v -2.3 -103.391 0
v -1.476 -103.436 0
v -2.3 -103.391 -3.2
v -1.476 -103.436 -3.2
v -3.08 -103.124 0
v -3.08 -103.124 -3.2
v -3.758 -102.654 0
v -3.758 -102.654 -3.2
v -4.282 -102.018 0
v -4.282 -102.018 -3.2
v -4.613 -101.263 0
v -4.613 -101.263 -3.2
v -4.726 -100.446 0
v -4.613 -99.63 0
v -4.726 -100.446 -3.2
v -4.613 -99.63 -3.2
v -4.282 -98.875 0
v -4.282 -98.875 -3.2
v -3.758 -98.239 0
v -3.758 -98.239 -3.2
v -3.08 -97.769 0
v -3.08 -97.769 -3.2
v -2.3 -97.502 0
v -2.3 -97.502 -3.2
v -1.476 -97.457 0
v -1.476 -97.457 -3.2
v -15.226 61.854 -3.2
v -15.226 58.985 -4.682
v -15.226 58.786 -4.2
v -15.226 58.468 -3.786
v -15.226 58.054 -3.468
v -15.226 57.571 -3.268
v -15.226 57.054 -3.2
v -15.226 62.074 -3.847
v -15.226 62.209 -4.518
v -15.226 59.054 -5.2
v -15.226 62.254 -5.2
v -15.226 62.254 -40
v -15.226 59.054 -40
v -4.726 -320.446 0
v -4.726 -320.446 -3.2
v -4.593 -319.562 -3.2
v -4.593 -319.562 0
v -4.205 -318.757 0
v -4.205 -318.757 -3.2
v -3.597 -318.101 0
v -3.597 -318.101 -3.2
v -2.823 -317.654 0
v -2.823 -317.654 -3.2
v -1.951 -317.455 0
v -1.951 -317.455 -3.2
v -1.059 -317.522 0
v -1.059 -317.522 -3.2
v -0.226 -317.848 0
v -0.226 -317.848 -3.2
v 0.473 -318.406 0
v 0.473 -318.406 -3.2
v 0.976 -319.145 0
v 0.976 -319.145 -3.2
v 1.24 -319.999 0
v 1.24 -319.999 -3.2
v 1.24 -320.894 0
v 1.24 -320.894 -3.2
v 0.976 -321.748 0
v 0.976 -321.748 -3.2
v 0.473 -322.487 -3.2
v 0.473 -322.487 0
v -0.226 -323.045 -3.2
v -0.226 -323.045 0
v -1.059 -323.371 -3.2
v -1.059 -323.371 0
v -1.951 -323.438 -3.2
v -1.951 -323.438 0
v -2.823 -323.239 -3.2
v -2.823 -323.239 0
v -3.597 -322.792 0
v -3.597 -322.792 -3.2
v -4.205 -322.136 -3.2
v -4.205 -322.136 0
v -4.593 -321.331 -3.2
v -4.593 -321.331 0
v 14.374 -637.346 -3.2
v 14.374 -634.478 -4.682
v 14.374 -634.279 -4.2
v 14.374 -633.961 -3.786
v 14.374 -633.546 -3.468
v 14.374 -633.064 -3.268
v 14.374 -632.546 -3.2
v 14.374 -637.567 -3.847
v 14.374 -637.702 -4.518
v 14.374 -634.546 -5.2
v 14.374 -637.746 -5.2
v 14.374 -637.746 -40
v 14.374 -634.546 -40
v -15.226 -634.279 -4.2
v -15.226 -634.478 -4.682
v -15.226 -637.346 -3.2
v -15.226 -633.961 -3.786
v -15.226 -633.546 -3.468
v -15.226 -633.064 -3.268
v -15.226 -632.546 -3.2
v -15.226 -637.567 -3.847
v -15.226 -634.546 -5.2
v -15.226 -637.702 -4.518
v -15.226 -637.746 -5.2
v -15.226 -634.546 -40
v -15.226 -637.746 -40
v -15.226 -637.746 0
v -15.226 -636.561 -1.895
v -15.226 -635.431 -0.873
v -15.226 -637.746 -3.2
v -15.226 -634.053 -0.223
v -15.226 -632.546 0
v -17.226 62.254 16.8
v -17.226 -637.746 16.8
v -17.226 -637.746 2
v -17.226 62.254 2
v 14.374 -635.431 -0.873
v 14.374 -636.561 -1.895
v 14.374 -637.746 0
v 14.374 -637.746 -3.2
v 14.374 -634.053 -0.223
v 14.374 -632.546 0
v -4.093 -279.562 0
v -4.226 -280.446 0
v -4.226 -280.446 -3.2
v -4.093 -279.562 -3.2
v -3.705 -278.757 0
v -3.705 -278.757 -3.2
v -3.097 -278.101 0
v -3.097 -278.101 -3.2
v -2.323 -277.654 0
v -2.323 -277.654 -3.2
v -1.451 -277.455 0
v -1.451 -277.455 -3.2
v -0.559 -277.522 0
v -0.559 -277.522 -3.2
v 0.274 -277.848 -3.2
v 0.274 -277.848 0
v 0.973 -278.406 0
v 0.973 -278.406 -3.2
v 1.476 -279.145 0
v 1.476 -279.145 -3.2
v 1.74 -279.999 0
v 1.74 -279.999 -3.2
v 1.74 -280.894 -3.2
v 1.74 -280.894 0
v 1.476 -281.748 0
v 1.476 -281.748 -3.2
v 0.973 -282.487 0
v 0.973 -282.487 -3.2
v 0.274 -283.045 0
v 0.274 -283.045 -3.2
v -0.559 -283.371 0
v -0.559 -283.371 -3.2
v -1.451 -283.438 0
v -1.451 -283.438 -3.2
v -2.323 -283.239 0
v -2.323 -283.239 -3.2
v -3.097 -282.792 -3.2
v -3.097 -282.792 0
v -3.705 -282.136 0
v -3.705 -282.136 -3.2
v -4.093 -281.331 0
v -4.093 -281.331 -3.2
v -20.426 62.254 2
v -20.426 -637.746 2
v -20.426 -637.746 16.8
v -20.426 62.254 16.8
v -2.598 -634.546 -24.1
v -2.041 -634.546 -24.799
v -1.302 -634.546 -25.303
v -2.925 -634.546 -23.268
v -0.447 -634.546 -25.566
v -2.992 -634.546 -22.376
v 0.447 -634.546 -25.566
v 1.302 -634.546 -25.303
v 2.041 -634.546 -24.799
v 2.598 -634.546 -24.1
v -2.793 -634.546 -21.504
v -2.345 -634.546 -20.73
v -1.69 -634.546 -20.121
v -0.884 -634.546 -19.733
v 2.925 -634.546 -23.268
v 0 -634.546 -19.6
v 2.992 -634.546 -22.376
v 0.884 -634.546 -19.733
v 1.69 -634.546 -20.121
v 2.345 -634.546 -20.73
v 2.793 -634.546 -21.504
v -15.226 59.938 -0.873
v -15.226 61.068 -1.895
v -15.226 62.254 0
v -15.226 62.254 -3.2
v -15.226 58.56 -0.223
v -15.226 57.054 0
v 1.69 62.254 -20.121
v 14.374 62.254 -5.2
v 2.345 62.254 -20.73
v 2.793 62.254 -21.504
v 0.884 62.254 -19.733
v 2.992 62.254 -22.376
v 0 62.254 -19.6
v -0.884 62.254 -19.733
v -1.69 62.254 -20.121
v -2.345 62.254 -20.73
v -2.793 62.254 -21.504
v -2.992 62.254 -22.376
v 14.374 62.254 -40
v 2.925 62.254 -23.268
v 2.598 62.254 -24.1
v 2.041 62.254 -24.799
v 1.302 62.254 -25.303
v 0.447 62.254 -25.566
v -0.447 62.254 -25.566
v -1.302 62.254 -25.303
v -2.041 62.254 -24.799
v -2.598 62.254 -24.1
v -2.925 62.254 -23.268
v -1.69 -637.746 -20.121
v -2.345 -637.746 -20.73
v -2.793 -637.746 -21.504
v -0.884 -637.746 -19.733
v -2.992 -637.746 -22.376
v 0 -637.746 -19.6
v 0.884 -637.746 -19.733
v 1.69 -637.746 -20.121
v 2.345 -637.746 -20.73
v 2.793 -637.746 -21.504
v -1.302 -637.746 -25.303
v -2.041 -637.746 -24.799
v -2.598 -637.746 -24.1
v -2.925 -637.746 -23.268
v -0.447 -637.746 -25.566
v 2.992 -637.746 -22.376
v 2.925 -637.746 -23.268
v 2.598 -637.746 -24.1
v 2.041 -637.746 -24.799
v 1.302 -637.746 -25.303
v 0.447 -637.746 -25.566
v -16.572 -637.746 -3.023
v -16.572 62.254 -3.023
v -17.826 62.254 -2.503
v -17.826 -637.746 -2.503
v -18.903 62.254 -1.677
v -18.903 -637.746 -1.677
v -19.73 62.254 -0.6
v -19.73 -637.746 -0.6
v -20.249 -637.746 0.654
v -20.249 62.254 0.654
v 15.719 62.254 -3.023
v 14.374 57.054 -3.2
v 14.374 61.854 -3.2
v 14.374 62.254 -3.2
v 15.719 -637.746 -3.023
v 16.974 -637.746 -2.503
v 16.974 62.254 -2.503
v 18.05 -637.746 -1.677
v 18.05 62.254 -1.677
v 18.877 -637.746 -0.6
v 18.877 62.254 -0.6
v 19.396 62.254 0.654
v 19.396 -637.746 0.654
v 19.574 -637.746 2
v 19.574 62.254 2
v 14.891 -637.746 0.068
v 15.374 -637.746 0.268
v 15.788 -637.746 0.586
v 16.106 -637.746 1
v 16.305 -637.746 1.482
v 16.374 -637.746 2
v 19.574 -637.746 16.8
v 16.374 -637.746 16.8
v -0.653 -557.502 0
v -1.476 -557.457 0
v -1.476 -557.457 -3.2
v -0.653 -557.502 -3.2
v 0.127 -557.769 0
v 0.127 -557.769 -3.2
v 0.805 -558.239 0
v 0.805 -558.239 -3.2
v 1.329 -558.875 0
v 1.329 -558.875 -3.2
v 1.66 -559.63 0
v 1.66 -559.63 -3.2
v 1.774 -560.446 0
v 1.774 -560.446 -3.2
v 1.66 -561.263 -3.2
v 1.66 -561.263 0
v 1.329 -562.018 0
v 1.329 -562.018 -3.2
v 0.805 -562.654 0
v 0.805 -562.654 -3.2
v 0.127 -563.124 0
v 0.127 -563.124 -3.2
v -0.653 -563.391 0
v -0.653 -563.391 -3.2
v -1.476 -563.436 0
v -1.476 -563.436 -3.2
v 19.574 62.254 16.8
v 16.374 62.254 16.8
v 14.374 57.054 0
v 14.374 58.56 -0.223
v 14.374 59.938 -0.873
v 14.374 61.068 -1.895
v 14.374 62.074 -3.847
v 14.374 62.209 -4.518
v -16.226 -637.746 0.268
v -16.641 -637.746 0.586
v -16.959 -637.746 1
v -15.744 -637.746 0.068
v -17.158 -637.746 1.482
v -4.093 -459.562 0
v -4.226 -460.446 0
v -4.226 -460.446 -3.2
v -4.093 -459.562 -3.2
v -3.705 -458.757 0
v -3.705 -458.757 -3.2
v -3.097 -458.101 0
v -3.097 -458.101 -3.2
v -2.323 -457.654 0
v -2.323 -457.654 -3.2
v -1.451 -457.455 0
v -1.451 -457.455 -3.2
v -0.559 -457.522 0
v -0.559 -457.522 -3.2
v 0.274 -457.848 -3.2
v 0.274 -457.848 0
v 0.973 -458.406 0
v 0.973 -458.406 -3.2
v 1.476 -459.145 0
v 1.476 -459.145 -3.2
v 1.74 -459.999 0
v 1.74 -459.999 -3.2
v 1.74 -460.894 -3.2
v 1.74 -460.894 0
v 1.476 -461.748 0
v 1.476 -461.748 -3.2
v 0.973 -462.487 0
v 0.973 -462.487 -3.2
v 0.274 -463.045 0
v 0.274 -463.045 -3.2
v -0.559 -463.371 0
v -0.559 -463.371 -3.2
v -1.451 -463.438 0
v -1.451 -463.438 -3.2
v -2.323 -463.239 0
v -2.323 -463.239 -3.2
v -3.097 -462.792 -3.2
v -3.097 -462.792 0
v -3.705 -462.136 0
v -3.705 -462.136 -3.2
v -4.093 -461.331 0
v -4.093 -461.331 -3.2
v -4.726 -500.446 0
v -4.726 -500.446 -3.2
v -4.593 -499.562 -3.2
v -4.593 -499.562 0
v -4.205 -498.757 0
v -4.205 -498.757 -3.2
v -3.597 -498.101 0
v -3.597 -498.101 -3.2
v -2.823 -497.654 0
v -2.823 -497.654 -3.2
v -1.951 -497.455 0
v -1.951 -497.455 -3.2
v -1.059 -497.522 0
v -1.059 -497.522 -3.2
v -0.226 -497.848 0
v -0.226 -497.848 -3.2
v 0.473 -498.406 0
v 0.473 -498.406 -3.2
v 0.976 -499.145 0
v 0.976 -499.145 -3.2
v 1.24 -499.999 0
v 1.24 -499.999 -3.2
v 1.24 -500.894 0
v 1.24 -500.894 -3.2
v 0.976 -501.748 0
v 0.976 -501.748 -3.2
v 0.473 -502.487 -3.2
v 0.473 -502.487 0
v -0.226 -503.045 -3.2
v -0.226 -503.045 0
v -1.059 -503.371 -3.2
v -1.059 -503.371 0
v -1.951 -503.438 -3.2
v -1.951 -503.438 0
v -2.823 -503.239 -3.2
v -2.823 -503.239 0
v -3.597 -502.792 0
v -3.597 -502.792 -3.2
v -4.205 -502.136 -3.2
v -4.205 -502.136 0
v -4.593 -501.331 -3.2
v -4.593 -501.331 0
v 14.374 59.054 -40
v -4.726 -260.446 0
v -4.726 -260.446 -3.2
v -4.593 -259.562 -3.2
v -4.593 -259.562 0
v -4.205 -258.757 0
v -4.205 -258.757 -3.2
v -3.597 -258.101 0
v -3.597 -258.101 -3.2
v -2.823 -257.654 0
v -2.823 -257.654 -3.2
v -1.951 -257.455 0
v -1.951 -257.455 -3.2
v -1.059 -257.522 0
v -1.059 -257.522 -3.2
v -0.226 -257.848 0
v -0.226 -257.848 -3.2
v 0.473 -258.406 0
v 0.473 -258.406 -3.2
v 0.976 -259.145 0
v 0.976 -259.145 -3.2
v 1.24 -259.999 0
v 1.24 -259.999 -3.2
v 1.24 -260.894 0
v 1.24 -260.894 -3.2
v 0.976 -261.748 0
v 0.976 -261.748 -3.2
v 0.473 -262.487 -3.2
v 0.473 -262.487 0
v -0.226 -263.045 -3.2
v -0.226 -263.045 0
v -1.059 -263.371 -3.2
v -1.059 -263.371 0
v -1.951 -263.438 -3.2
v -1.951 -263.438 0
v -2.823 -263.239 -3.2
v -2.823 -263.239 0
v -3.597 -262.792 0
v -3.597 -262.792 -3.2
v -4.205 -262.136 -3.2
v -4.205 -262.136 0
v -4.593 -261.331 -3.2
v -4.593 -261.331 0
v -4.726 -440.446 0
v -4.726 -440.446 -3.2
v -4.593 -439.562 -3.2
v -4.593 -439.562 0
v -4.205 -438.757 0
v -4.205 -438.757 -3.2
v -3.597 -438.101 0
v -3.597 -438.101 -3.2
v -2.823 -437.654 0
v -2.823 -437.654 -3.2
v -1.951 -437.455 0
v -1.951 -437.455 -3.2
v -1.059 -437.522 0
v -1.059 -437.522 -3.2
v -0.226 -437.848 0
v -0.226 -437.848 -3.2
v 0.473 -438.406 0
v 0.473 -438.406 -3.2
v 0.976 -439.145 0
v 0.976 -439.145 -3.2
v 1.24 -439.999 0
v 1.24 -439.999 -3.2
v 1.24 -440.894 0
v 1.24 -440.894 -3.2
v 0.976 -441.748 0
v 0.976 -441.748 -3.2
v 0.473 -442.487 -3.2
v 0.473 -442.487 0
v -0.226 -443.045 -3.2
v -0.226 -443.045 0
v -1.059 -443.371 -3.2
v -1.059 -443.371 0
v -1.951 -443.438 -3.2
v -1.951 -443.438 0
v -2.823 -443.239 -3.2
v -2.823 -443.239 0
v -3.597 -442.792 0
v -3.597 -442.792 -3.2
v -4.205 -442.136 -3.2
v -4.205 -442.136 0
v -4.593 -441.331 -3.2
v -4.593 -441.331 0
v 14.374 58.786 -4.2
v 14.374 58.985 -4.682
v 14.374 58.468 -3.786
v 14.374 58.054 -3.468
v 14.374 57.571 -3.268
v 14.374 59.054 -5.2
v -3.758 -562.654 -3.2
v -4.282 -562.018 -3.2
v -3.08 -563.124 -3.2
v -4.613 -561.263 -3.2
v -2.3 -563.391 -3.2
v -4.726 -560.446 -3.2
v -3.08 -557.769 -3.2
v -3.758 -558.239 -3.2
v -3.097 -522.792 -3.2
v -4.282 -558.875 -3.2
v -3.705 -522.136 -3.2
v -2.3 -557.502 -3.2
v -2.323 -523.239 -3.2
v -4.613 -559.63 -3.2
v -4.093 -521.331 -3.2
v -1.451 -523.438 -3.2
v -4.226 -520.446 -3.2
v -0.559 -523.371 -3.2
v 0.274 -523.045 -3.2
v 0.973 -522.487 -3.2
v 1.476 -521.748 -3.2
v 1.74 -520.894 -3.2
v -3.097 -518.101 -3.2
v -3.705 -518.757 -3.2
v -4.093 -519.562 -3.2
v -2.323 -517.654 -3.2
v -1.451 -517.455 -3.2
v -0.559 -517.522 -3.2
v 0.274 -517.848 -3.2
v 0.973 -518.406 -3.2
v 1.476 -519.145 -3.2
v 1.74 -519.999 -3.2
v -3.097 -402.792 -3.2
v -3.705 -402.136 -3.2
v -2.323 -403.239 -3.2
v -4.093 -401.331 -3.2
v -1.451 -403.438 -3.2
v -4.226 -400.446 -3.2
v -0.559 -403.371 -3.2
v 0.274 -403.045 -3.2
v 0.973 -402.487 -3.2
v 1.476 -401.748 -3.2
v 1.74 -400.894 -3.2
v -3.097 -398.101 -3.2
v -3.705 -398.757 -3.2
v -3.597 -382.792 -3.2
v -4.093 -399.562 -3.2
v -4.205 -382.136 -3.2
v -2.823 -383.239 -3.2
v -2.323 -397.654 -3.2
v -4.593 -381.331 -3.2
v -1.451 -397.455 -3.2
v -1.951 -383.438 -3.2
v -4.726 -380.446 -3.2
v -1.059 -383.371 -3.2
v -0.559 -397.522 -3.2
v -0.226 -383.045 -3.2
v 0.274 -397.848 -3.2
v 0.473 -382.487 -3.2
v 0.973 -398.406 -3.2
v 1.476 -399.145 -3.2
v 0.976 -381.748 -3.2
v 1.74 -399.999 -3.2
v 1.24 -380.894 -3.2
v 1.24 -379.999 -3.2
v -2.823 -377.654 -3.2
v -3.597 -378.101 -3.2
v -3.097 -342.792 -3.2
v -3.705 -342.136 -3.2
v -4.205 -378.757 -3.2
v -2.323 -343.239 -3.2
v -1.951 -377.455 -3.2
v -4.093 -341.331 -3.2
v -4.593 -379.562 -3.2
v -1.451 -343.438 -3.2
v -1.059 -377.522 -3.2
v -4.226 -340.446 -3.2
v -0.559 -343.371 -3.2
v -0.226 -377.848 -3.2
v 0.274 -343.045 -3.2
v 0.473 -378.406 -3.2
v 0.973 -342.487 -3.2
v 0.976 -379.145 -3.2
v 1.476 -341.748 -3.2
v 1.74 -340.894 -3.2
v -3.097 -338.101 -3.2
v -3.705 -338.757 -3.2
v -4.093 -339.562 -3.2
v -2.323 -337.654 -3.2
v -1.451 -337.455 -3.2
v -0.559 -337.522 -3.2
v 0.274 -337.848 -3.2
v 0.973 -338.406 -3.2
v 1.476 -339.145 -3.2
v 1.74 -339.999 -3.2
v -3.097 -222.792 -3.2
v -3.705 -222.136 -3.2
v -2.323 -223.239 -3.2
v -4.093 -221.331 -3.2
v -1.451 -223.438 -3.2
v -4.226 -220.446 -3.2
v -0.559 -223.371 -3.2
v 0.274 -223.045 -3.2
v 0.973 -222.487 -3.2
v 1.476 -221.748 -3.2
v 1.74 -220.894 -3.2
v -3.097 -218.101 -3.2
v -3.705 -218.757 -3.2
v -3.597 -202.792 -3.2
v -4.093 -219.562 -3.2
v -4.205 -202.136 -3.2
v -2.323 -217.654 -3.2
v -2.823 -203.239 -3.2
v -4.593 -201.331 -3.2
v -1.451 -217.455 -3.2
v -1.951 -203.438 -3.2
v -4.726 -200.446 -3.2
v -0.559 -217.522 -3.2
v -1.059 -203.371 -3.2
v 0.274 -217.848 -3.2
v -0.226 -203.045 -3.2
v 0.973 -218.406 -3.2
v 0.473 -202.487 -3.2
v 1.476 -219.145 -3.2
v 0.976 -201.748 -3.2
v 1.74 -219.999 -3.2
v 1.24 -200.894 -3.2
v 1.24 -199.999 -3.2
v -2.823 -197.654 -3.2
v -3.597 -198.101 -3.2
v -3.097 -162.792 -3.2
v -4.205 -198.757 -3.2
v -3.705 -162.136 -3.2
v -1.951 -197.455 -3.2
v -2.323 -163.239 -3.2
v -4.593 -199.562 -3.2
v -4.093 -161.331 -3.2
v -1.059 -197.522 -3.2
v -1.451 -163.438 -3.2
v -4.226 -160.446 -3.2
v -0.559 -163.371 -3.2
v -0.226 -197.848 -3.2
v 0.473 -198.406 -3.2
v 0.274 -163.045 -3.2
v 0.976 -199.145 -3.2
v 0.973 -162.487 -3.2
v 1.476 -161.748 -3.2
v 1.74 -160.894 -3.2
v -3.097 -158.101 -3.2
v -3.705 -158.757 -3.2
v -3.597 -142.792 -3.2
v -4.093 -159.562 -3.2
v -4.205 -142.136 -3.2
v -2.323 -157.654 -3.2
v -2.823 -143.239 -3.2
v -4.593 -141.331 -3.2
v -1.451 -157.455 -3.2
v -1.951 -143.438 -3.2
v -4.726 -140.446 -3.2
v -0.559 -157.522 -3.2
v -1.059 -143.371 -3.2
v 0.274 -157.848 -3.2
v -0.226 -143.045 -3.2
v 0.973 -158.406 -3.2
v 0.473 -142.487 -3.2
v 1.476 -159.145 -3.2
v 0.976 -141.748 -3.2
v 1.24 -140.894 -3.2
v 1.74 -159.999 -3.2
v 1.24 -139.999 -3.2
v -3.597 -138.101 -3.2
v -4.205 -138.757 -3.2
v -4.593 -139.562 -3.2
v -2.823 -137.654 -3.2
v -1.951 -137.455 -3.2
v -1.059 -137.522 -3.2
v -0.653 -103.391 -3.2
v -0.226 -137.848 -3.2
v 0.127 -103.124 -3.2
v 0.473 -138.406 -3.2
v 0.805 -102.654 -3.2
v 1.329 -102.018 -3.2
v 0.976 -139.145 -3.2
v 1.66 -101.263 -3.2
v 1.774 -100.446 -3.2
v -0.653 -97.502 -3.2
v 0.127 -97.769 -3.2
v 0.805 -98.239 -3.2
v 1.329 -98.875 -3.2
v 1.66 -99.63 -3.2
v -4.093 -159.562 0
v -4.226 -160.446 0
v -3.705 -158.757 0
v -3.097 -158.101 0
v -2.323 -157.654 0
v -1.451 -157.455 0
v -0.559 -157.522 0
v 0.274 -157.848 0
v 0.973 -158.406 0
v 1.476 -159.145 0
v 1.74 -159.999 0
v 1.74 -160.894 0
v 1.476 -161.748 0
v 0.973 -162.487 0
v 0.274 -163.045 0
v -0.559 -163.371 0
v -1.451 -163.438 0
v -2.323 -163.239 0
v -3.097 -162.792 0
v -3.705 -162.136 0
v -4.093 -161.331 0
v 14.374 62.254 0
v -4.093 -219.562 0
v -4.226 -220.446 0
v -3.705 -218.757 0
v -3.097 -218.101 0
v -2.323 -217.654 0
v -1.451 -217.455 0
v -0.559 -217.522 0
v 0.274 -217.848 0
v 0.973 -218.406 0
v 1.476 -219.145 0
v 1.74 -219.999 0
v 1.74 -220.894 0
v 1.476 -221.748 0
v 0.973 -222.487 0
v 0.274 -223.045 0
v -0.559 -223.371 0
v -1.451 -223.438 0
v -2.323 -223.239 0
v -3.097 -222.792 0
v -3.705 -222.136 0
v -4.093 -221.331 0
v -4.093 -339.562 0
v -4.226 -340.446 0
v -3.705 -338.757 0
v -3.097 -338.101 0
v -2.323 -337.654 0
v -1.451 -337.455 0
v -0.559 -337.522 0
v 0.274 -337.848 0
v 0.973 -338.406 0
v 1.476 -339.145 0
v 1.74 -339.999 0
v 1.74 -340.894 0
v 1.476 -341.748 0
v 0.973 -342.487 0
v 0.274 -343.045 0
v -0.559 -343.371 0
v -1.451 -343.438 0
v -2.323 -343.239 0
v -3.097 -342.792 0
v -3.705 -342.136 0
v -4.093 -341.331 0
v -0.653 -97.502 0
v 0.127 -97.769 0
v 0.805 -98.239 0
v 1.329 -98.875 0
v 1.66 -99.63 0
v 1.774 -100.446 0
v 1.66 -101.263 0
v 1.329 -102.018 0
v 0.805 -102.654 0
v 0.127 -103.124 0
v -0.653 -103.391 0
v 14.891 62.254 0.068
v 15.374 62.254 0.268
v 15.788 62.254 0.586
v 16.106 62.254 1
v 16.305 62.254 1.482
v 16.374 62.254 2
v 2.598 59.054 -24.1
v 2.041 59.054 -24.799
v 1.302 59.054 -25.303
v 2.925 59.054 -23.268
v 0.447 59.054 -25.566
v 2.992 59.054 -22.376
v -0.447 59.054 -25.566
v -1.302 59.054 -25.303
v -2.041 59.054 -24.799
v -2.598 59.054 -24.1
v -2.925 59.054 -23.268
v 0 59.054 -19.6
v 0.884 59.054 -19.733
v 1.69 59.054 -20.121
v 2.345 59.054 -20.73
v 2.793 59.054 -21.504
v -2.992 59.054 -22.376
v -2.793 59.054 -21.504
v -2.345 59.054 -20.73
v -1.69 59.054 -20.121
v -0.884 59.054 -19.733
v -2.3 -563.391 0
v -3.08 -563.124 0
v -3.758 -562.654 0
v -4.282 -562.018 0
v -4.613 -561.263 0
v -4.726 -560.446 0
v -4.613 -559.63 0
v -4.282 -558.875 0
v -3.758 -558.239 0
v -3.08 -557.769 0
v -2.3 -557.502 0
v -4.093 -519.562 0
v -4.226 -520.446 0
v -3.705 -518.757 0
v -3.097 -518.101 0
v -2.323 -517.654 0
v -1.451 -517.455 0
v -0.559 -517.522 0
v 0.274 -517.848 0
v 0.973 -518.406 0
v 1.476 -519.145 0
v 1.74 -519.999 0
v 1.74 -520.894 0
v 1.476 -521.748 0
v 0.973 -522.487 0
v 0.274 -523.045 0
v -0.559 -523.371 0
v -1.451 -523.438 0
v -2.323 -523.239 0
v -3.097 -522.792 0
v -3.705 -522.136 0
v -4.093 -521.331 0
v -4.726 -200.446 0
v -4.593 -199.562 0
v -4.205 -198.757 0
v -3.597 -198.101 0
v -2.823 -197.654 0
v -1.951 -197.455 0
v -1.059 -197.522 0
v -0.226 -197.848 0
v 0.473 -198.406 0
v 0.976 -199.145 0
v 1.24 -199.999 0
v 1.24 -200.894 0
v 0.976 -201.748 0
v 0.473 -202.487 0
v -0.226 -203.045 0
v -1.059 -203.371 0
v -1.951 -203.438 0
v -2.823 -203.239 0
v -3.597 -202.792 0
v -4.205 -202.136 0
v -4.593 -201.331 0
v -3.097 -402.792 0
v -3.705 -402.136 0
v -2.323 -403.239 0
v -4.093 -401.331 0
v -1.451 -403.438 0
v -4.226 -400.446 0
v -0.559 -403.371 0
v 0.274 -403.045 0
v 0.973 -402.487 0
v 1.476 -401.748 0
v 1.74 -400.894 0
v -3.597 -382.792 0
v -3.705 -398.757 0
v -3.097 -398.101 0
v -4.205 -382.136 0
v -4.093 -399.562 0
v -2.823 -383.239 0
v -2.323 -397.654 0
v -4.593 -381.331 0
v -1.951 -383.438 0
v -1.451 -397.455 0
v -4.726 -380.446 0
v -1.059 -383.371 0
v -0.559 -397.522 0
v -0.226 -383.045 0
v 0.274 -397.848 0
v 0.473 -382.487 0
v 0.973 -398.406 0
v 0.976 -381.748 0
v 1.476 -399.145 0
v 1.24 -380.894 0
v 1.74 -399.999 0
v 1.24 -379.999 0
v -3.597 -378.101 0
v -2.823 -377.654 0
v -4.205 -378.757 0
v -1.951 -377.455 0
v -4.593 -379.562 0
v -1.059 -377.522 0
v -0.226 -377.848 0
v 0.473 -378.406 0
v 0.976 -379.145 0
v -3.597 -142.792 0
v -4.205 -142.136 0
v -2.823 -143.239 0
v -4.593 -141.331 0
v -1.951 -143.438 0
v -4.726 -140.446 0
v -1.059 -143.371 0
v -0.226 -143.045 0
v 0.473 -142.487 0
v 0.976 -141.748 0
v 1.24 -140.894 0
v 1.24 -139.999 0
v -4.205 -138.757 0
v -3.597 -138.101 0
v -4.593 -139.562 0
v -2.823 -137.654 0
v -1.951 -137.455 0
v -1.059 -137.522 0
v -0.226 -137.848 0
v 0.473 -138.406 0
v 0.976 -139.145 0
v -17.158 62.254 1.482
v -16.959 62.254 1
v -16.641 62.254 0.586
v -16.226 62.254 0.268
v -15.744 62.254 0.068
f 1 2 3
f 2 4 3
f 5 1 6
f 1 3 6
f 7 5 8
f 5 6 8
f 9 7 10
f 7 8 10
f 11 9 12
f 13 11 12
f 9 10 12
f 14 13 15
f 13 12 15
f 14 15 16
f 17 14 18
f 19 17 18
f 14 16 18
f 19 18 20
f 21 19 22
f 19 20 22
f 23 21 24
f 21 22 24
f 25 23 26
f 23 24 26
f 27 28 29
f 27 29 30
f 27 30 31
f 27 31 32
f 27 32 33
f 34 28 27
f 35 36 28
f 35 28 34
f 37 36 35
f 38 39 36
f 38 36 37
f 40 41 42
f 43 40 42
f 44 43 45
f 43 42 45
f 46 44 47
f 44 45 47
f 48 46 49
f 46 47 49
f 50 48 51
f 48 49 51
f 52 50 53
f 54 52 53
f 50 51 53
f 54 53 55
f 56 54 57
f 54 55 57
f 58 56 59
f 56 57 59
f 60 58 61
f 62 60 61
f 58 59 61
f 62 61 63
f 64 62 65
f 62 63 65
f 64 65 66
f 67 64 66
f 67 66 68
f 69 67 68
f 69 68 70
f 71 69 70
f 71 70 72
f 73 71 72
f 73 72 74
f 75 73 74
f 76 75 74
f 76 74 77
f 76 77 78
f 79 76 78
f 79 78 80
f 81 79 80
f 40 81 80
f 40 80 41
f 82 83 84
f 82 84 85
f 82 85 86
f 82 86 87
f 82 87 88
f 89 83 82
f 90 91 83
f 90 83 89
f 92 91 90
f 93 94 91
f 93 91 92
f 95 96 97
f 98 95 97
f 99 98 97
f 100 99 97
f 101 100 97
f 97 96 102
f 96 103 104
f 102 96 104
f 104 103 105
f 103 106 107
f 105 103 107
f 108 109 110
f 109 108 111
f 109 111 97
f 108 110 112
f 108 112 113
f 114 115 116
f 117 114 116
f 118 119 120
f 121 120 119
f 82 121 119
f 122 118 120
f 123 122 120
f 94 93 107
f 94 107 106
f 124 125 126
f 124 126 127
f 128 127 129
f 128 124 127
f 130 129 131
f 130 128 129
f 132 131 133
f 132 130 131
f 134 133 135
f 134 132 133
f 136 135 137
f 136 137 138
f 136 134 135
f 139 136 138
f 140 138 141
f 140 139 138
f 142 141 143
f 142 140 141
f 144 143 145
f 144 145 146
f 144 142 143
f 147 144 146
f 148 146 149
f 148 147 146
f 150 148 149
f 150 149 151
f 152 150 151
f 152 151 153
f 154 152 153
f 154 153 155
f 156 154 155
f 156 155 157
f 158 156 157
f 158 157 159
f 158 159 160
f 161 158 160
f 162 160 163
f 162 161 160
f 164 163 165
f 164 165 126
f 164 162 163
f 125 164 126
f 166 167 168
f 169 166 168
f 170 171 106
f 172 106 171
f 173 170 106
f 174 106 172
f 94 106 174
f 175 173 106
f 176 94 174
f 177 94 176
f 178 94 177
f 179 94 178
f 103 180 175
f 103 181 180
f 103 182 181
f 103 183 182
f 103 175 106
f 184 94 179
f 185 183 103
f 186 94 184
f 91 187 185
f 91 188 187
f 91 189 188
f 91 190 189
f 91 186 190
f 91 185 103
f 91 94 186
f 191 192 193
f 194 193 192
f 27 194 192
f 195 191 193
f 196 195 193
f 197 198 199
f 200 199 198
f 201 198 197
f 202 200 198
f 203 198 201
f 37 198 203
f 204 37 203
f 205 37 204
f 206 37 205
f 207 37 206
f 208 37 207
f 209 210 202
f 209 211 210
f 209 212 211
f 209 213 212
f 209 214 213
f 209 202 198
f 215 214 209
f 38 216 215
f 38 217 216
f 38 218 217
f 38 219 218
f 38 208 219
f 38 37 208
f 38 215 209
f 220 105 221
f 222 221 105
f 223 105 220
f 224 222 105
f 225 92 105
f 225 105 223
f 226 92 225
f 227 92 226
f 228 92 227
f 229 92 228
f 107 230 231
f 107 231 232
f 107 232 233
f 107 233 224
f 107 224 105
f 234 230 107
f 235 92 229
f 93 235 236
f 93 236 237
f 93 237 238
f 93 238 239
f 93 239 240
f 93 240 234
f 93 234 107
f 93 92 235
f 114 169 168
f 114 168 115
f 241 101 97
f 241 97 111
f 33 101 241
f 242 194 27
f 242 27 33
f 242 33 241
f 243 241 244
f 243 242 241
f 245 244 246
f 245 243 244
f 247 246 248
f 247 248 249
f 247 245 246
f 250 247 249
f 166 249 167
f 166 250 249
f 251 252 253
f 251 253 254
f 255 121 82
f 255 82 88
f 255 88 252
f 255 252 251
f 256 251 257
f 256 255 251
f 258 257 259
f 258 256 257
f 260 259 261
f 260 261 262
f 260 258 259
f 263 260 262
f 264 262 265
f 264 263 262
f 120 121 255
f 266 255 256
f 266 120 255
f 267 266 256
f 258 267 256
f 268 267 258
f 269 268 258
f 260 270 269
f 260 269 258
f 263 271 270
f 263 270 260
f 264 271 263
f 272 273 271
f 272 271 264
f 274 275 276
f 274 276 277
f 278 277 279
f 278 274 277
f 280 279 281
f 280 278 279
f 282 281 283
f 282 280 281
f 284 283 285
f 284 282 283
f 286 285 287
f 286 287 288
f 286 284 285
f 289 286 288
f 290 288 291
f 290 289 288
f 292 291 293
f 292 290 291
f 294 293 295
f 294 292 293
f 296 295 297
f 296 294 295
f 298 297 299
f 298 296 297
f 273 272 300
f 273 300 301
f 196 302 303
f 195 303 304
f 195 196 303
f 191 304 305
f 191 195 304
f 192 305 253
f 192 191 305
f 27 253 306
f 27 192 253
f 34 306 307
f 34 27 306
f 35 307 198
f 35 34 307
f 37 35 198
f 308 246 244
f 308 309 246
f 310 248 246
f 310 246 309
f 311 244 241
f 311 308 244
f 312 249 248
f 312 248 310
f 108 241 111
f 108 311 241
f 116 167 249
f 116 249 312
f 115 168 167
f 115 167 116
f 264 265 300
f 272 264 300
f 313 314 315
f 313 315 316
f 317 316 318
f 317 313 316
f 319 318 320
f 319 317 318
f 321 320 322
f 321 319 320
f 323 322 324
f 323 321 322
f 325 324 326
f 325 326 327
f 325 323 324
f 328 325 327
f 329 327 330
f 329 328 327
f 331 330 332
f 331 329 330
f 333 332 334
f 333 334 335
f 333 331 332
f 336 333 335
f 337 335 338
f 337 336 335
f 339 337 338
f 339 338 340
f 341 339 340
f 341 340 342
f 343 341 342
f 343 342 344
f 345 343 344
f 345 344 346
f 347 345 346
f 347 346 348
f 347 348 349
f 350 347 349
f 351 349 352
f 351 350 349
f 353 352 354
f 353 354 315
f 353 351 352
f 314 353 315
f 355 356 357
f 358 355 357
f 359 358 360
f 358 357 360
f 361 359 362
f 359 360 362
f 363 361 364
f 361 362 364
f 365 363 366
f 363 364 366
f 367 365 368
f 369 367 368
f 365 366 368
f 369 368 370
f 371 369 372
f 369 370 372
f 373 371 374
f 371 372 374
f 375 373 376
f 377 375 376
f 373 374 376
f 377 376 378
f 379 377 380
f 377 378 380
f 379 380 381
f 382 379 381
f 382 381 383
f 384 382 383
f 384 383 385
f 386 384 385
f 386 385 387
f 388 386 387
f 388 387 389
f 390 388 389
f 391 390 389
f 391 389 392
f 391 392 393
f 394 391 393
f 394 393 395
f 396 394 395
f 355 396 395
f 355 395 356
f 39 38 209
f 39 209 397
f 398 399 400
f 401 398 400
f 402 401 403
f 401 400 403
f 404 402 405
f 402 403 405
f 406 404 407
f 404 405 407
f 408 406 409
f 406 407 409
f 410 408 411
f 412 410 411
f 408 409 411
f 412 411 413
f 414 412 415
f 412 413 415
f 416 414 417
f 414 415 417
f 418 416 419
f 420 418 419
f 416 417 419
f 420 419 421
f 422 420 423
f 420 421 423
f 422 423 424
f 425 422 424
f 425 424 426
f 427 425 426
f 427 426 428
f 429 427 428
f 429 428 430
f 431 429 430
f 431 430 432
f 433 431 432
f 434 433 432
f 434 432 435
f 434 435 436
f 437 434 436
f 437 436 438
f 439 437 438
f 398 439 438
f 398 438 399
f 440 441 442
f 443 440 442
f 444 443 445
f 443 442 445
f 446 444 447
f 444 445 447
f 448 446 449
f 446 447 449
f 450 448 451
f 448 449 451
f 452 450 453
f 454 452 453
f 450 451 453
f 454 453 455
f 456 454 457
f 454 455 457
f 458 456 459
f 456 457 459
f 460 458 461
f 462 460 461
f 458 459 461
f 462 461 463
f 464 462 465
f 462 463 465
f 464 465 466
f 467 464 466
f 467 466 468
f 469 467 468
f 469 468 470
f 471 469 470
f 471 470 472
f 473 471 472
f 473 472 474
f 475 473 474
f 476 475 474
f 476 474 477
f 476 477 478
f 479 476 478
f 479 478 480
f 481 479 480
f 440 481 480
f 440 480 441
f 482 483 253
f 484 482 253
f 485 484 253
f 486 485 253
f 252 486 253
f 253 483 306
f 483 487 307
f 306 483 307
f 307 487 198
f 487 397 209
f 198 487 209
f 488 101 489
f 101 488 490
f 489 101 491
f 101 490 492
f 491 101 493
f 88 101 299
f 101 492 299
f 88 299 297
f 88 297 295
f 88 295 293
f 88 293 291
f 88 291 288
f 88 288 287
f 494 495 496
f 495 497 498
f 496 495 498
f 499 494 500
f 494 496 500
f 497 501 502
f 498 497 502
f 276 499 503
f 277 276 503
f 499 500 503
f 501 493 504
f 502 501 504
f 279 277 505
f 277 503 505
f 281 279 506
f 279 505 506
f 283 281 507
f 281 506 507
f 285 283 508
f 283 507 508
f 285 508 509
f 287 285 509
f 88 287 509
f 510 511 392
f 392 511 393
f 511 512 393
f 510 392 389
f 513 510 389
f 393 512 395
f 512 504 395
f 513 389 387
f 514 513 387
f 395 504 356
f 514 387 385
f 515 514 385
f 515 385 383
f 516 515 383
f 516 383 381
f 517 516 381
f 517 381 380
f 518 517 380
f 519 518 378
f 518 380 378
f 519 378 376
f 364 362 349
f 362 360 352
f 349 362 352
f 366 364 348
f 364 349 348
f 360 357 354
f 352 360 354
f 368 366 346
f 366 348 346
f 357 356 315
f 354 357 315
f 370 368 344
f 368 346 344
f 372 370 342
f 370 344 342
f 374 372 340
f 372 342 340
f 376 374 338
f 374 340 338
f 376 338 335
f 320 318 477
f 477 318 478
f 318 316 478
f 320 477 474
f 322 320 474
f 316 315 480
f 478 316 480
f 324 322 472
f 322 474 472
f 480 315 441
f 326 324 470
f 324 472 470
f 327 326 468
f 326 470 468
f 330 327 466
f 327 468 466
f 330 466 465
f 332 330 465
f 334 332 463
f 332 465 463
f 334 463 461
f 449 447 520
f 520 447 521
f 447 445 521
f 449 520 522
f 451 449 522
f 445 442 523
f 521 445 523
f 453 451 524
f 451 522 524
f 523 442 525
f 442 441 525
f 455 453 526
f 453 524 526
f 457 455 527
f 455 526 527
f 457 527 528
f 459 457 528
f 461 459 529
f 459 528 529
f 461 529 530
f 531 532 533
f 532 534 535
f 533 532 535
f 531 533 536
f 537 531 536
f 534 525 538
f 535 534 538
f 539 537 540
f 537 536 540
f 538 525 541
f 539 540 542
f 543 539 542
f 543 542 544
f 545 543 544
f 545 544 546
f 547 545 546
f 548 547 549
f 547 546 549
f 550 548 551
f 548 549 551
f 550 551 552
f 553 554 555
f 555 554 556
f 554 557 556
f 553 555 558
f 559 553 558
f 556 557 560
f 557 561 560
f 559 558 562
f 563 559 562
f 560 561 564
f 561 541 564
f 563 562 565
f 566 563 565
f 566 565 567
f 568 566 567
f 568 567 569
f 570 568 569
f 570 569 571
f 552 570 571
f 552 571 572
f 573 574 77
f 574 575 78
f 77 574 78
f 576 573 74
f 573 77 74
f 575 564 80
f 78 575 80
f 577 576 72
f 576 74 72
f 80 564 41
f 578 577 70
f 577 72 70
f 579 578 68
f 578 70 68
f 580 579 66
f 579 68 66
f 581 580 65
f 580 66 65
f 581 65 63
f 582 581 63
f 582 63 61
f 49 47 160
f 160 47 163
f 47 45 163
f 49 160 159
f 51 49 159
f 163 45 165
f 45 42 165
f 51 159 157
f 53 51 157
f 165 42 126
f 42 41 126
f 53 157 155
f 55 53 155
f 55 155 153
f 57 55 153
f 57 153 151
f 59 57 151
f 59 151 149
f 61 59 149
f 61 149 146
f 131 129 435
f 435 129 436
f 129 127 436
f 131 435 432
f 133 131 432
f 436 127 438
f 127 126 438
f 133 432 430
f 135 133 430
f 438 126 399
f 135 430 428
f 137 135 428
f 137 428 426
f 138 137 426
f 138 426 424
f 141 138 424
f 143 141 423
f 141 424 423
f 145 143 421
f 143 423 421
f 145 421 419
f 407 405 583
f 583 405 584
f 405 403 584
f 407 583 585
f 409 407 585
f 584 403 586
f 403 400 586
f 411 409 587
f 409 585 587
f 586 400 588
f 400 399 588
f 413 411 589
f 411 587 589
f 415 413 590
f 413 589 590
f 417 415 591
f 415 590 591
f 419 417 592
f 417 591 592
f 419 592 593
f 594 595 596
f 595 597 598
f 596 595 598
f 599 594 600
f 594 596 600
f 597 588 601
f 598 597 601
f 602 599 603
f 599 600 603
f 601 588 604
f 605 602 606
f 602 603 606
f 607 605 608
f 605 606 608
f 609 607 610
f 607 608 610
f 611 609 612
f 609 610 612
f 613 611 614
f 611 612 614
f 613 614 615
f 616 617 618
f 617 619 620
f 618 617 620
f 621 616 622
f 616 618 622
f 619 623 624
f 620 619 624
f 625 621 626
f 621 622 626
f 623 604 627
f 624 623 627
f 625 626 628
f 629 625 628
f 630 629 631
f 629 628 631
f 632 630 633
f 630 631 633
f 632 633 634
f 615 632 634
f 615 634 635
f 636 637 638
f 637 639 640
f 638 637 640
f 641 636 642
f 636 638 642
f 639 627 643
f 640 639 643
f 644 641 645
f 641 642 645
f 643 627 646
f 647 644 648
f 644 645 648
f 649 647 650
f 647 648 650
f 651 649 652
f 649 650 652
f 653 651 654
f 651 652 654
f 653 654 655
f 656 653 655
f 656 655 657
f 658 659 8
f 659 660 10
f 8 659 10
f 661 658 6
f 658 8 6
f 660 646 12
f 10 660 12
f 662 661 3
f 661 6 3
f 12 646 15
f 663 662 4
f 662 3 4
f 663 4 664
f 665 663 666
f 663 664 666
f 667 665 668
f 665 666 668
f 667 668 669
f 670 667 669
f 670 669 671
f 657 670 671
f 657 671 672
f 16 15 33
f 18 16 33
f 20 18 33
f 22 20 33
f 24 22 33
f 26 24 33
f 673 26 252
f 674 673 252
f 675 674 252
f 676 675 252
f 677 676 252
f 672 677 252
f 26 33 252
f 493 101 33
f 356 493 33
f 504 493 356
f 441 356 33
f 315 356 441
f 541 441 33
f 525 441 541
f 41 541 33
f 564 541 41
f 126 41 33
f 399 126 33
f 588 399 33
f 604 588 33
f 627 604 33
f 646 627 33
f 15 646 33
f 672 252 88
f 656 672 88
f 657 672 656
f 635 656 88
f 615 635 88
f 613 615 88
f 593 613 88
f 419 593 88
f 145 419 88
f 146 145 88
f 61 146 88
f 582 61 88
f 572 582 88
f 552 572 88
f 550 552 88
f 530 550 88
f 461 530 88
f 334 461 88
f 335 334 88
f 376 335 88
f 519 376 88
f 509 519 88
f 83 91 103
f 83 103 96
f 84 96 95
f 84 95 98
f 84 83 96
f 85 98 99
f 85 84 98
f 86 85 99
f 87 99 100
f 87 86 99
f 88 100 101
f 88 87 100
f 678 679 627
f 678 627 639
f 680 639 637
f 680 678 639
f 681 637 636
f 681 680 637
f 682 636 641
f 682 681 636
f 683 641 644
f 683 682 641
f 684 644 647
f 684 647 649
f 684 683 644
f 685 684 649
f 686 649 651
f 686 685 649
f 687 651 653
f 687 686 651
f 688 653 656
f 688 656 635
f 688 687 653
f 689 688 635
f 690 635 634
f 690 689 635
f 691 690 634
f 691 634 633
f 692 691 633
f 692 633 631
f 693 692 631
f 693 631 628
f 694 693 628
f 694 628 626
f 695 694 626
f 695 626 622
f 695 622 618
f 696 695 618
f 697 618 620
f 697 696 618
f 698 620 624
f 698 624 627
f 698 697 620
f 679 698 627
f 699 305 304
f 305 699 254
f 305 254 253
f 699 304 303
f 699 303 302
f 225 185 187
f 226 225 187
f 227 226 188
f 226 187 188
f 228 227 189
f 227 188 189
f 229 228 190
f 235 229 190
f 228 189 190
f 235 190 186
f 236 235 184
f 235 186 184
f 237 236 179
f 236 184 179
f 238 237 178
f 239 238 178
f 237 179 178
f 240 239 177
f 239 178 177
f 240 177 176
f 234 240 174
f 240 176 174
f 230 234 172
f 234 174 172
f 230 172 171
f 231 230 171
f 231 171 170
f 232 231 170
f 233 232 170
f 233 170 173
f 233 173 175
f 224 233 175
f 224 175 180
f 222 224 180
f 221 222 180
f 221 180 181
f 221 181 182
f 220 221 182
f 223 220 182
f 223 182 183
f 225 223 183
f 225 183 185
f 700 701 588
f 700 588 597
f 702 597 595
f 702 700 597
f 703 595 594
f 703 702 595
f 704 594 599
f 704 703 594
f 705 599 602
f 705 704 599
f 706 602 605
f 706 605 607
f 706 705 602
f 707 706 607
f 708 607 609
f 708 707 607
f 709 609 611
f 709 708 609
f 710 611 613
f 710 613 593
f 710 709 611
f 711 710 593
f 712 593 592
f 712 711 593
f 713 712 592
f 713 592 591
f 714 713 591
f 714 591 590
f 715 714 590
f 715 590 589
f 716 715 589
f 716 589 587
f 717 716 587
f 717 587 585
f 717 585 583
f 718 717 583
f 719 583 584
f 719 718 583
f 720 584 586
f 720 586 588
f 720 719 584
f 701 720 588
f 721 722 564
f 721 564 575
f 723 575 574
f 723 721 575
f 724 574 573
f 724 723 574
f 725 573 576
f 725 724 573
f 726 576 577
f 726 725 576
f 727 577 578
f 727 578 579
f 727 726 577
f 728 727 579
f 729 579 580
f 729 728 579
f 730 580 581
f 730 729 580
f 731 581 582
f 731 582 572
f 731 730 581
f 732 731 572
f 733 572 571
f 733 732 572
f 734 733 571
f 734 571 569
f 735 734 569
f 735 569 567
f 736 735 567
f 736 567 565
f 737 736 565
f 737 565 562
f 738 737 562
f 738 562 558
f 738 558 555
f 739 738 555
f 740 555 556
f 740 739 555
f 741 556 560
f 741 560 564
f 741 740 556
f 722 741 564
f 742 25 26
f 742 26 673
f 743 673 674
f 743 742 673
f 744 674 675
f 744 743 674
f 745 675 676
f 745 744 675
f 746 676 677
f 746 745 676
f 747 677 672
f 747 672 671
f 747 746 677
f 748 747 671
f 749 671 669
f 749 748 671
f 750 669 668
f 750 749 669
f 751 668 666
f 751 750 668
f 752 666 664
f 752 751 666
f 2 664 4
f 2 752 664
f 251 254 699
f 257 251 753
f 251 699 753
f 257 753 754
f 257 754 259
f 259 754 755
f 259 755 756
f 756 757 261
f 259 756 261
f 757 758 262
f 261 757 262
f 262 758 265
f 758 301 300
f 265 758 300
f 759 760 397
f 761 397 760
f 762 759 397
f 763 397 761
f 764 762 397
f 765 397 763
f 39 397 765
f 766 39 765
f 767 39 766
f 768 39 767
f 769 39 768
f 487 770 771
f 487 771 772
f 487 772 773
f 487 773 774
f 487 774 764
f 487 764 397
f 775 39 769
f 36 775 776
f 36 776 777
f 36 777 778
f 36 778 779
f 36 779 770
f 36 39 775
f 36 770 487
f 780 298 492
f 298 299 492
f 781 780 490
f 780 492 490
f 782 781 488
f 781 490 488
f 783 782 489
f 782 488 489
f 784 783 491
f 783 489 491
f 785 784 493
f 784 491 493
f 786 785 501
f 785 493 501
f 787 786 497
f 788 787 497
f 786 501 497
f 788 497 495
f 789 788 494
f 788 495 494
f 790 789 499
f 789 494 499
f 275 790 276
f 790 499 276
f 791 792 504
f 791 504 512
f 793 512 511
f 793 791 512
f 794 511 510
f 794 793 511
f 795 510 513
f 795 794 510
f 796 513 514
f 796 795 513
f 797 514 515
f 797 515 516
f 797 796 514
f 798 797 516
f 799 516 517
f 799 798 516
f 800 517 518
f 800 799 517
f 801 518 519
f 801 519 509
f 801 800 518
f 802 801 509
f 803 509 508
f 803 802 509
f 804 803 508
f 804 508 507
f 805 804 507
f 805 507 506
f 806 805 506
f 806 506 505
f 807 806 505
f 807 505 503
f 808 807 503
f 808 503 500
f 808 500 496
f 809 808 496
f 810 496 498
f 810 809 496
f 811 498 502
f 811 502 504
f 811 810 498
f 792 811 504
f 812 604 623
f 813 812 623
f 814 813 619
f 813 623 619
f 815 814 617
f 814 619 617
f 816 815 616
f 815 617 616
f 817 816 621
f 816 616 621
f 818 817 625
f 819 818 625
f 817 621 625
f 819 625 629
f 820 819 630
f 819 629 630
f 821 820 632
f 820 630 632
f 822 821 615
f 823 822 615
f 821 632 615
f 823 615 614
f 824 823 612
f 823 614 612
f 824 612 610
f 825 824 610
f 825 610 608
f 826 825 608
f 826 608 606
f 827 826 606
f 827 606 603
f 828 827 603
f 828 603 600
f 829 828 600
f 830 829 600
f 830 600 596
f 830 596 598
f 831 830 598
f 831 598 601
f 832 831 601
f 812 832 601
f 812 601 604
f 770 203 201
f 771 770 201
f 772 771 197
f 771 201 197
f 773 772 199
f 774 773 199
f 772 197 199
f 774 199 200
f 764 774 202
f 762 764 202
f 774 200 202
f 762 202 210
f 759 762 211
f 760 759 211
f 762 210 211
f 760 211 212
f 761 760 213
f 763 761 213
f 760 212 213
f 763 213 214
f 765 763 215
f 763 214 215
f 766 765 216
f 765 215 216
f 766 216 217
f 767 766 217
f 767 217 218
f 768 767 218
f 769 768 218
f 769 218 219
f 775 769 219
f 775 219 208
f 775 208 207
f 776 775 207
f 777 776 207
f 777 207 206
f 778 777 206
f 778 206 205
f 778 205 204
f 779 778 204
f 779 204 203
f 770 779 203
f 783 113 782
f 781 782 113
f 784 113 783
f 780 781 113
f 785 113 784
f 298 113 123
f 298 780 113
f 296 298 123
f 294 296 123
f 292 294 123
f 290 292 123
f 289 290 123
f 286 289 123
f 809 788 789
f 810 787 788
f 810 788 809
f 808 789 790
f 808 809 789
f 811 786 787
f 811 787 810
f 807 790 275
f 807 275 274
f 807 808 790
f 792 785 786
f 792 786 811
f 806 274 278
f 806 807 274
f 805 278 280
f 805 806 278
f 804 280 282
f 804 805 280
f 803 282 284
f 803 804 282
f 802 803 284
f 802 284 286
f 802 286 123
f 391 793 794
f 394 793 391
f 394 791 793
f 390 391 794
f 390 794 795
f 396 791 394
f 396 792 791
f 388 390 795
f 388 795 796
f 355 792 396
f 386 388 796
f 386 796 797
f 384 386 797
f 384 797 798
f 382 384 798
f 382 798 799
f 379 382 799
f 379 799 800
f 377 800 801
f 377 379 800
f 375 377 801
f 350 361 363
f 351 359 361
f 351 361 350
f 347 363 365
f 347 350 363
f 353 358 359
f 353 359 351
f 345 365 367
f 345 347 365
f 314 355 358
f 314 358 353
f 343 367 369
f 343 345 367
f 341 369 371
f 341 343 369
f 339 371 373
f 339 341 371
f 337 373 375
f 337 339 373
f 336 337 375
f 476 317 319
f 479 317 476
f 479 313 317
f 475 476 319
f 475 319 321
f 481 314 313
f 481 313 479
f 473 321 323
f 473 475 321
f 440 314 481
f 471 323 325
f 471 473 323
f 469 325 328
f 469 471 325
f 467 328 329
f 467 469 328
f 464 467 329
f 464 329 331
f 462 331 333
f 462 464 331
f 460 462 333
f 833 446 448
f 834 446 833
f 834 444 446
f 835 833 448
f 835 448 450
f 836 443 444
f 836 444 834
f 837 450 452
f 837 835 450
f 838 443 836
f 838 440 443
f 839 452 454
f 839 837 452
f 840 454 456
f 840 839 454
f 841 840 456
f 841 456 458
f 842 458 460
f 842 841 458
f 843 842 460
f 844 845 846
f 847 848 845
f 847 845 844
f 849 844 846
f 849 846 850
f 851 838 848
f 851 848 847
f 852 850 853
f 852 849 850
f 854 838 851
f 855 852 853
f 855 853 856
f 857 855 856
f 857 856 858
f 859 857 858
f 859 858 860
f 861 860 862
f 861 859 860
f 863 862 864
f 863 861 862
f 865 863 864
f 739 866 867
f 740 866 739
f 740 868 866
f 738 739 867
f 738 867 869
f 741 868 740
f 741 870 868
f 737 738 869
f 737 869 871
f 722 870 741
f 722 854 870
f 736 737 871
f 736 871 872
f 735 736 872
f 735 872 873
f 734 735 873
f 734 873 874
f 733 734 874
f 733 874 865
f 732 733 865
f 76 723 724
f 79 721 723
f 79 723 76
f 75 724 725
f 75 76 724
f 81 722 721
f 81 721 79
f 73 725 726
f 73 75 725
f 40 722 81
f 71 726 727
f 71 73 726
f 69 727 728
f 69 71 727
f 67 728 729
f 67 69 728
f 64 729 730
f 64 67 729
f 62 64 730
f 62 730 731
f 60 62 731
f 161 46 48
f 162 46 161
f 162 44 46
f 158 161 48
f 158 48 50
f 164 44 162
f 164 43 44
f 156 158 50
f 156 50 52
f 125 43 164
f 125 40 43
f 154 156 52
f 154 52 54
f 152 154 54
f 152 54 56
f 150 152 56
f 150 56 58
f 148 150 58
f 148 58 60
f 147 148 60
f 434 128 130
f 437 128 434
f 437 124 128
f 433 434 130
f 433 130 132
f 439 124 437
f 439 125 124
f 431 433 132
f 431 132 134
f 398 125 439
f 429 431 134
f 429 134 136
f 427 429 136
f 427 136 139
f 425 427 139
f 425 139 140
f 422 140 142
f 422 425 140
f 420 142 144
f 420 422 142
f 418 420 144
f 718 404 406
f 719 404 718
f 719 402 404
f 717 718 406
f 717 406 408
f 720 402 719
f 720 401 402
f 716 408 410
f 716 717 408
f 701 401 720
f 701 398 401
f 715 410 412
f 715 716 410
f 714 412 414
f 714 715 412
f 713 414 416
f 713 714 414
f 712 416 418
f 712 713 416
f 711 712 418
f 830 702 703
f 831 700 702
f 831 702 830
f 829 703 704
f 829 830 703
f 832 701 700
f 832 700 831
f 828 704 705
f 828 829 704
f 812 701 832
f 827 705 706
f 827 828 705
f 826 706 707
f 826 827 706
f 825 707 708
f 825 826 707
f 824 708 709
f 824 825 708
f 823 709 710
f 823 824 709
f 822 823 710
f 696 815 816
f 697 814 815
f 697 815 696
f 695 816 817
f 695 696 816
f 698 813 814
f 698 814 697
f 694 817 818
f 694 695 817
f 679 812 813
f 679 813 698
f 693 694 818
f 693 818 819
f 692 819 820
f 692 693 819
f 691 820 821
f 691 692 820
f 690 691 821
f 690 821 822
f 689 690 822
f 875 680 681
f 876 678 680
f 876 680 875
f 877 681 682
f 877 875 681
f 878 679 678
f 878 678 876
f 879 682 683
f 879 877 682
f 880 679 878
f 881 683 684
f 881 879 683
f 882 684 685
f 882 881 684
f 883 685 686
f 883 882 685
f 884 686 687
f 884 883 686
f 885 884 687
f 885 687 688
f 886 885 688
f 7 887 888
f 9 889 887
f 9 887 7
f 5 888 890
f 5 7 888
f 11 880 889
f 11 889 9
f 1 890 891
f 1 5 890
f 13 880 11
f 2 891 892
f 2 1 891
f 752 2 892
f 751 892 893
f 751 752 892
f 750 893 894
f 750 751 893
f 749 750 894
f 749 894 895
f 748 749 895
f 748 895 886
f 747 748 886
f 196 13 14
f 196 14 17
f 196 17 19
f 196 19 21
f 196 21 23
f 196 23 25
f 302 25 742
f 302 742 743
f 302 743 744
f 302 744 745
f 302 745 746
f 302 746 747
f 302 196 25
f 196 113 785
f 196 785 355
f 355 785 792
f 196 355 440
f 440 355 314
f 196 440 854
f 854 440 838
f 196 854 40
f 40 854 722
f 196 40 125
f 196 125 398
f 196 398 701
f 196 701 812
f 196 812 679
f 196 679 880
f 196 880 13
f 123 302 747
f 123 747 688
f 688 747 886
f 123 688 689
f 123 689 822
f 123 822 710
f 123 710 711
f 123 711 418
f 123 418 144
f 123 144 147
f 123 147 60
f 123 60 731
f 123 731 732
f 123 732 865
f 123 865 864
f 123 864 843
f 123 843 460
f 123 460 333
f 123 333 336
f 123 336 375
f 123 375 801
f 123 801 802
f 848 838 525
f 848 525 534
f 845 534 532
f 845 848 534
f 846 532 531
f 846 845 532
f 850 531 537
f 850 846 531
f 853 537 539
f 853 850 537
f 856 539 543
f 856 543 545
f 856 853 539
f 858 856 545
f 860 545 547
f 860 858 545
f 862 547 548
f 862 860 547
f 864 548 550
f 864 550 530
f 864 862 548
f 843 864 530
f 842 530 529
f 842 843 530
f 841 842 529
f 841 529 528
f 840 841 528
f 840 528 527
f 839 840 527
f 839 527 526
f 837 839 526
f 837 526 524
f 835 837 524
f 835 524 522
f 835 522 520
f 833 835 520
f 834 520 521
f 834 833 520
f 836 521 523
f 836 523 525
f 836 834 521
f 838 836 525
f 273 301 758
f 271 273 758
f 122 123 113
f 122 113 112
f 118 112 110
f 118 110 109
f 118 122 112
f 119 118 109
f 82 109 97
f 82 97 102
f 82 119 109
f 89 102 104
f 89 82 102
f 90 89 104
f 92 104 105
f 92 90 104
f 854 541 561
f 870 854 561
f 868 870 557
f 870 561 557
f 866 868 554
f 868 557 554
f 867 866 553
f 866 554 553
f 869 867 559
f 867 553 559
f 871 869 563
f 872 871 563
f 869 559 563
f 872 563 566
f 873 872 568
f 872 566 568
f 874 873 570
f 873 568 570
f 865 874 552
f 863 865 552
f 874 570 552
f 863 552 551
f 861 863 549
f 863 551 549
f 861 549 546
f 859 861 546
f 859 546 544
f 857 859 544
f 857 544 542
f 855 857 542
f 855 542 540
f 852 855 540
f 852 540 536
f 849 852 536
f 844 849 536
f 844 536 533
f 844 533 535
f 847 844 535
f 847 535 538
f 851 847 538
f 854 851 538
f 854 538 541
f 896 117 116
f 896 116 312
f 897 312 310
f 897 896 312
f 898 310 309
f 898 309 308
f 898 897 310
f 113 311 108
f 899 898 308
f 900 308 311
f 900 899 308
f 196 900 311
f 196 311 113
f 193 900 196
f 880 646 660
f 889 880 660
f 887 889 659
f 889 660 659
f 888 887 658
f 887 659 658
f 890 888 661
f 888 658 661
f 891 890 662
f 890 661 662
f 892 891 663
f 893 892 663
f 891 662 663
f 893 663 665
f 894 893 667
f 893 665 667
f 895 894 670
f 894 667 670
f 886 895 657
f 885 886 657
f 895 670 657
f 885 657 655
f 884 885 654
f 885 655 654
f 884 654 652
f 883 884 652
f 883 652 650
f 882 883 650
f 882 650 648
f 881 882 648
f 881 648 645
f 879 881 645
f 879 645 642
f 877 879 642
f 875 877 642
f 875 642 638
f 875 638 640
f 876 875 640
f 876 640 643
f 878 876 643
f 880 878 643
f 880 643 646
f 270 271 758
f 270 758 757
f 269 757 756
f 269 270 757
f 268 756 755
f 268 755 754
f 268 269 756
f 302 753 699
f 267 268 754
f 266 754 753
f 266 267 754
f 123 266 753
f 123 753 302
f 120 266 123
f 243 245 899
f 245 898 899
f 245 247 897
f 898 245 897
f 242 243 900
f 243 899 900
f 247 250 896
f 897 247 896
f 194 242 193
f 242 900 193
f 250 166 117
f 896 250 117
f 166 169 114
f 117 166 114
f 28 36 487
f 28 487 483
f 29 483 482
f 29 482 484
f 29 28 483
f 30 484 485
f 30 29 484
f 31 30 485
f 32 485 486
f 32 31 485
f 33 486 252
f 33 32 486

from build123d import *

# Parameters (mm, degrees)
SKETCH1_W                      = 40
SKETCH1_H                      = 700
BASE_FLANGE1_DEPTH             = 3.2
EDGE_FLANGE1_STRIP_W           = 16.8
EDGE_FLANGE1_STRIP_H           = 3.2
EDGE_FLANGE1_STRIP_CUT_DEPTH   = 700
EDGE_FLANGE1_STRIP_2_W         = 16.8
EDGE_FLANGE1_STRIP_2_H         = 3.2
EDGE_FLANGE1_STRIP_CUT_2_DEPTH = 700
EDGE_FLANGE1_DEPTH             = 700
EDGE_FLANGE1_BEND_DEPTH        = 700
EDGE_FLANGE2_STRIP_W           = 16.8
EDGE_FLANGE2_STRIP_H           = 3.2
EDGE_FLANGE2_STRIP_CUT_DEPTH   = 29.6
EDGE_FLANGE2_STRIP_2_W         = 16.8
EDGE_FLANGE2_STRIP_2_H         = 3.2
EDGE_FLANGE2_STRIP_CUT_2_DEPTH = 29.6
EDGE_FLANGE2_DEPTH             = 29.6
EDGE_FLANGE2_BEND_DEPTH        = 29.6
SKETCH18_R                     = 3
CUT_EXTRUDE1_DEPTH             = 702.43940692
SKETCH29_R                     = 3
CUT_EXTRUDE12_DEPTH            = 15
CUT_EXTRUDE13_START            = -5.9
CUT_EXTRUDE13_OUTLINE_R        = 3
CUT_EXTRUDE13_DEPTH            = 3.2


# Read off the part's stored shape, not the designer's step: Cut-Extrude13
# Sheet-metal steps are written as plain solids
with BuildPart() as part:
    # Sketch1 → Base-Flange1 (new body)
    with BuildSketch(Plane.XY):
        with Locations((-0.426492134, -287.746478873)):
            Rectangle(SKETCH1_W, SKETCH1_H)
    extrude(amount=-BASE_FLANGE1_DEPTH)

    # Edge-Flange1 strip (across the edge) → Edge-Flange1 strip cut (cut)
    with BuildSketch(Plane(origin=(-20.426492134, 62.253521127, 0), x_dir=(1, 0, 0), z_dir=(0, -1, 0))):
        with Locations((-3.2, -1.6)):
            Rectangle(EDGE_FLANGE1_STRIP_W, EDGE_FLANGE1_STRIP_H)
    extrude(amount=EDGE_FLANGE1_STRIP_CUT_DEPTH, mode=Mode.SUBTRACT)

    # Edge-Flange1 strip 2 (across the edge) → Edge-Flange1 strip cut 2 (cut)
    with BuildSketch(Plane(origin=(19.573507866, -637.746478873, 0), x_dir=(-1, 0, 0), z_dir=(0, 1, 0))):
        with Locations((-3.2, -1.6)):
            Rectangle(EDGE_FLANGE1_STRIP_2_W, EDGE_FLANGE1_STRIP_2_H)
    extrude(amount=EDGE_FLANGE1_STRIP_CUT_2_DEPTH, mode=Mode.SUBTRACT)

    # Edge-Flange1 section (across the edge) → Edge-Flange1 (add)
    with BuildSketch(Plane(origin=(-20.426492134, 62.253521127, 0), x_dir=(1, 0, 0), z_dir=(0, -1, 0))):
        with BuildLine():
            Line((0, 2), (0, 16.8))
            Line((0, 16.8), (3.2, 16.8))
            Line((3.2, 16.8), (3.2, 2))
            ThreePointArc((3.2, 2), (3.785786438, 0.585786438), (5.2, 0))
            Line((5.2, 0), (5.2, -3.2))
            ThreePointArc((5.2, -3.2), (1.523044738, -1.676955262), (0, 2))
        make_face()
    extrude(amount=EDGE_FLANGE1_DEPTH)

    # Edge-Flange1 section 2 (across the edge) → Edge-Flange1 bend (add)
    with BuildSketch(Plane(origin=(19.573507866, -637.746478873, 0), x_dir=(-1, 0, 0), z_dir=(0, 1, 0))):
        with BuildLine():
            Line((0, 2), (0, 16.8))
            Line((0, 16.8), (3.2, 16.8))
            Line((3.2, 16.8), (3.2, 2))
            ThreePointArc((3.2, 2), (3.785786438, 0.585786438), (5.2, 0))
            Line((5.2, 0), (5.2, -3.2))
            ThreePointArc((5.2, -3.2), (1.523044738, -1.676955262), (0, 2))
        make_face()
    extrude(amount=EDGE_FLANGE1_BEND_DEPTH)

    # Edge-Flange2 strip (across the edge) → Edge-Flange2 strip cut (cut)
    with BuildSketch(Plane(origin=(-15.226492134, 62.253521127, -3.2), x_dir=(0, -1, 0), z_dir=(1, 0, 0))):
        with Locations((-3.2, -1.6)):
            Rectangle(EDGE_FLANGE2_STRIP_W, EDGE_FLANGE2_STRIP_H)
    extrude(amount=EDGE_FLANGE2_STRIP_CUT_DEPTH, mode=Mode.SUBTRACT)

    # Edge-Flange2 strip 2 (across the edge) → Edge-Flange2 strip cut 2 (cut)
    with BuildSketch(Plane(origin=(14.373507866, -637.746478873, -3.2), x_dir=(0, 1, 0), z_dir=(-1, 0, 0))):
        with Locations((-3.2, -1.6)):
            Rectangle(EDGE_FLANGE2_STRIP_2_W, EDGE_FLANGE2_STRIP_2_H)
    extrude(amount=EDGE_FLANGE2_STRIP_CUT_2_DEPTH, mode=Mode.SUBTRACT)

    # Edge-Flange2 section (across the edge) → Edge-Flange2 (add)
    with BuildSketch(Plane(origin=(-15.226492134, 62.253521127, -3.2), x_dir=(0, -1, 0), z_dir=(1, 0, 0))):
        with BuildLine():
            Line((0, 2), (0, 36.8))
            Line((0, 36.8), (3.2, 36.8))
            Line((3.2, 36.8), (3.2, 2))
            ThreePointArc((3.2, 2), (3.785786438, 0.585786438), (5.2, 0))
            Line((5.2, 0), (5.2, -3.2))
            ThreePointArc((5.2, -3.2), (1.523044738, -1.676955262), (0, 2))
        make_face()
    extrude(amount=EDGE_FLANGE2_DEPTH)

    # Edge-Flange2 section 2 (across the edge) → Edge-Flange2 bend (add)
    with BuildSketch(Plane(origin=(14.373507866, -637.746478873, -3.2), x_dir=(0, 1, 0), z_dir=(-1, 0, 0))):
        with BuildLine():
            Line((0, 2), (0, 36.8))
            Line((0, 36.8), (3.2, 36.8))
            Line((3.2, 36.8), (3.2, 2))
            ThreePointArc((3.2, 2), (3.785786438, 0.585786438), (5.2, 0))
            Line((5.2, 0), (5.2, -3.2))
            ThreePointArc((5.2, -3.2), (1.523044738, -1.676955262), (0, 2))
        make_face()
    extrude(amount=EDGE_FLANGE2_BEND_DEPTH)

    # Sketch18 → Cut-Extrude1 (cut, through all)
    with BuildSketch(Plane(origin=(0, 62.253521127, 0), x_dir=(1, 0, 0), z_dir=(0, 1, 0))):
        with Locations(Location((0, 22.6, 0), (0, 0, 270))):
            Circle(SKETCH18_R)
    extrude(amount=-CUT_EXTRUDE1_DEPTH, mode=Mode.SUBTRACT)

    # Sketch29 → Cut-Extrude12 (cut)
    with BuildSketch(Plane(origin=(98.729905779, -312.144507489, -5.9), x_dir=(-1, 0, 0), z_dir=(0, 0, -1))):
        with Locations((100.456397914, 211.698028616)):
            Circle(SKETCH29_R)
        with Locations((100.456397914, 171.698028616)):
            Circle(SKETCH29_R)
        with Locations((100.456397914, 111.698028616)):
            Circle(SKETCH29_R)
        with Locations((100.456397914, 51.698028616)):
            Circle(SKETCH29_R)
        with Locations((100.456397914, -8.301971384)):
            Circle(SKETCH29_R)
        with Locations((100.456397914, -68.301971384)):
            Circle(SKETCH29_R)
        with Locations((100.456397914, -128.301971384)):
            Circle(SKETCH29_R)
        with Locations((100.456397914, -188.301971384)):
            Circle(SKETCH29_R)
        with Locations((100.456397914, -248.301971384)):
            Circle(SKETCH29_R)
    extrude(amount=-CUT_EXTRUDE12_DEPTH, mode=Mode.SUBTRACT)

    # Cut-Extrude13 outline → Cut-Extrude13 (cut)
    with BuildSketch(Plane(origin=(260.729905779, -312.144507489, -5.9), x_dir=(-1, 0, 0), z_dir=(0, 0, -1)).offset(CUT_EXTRUDE13_START)):
        with BuildLine():
            ThreePointArc((262.206397914, -251.29153657), (259.456397914, -248.301971384), (262.206397914, -245.312406198))
            ThreePointArc((262.206397914, -245.312406198), (258.956397914, -248.301971384), (262.206397914, -251.29153657))
        make_face()
        with BuildLine():
            ThreePointArc((262.206397914, 208.70846343), (259.456397914, 211.698028616), (262.206397914, 214.687593802))
            ThreePointArc((262.206397914, 214.687593802), (258.956397914, 211.698028616), (262.206397914, 208.70846343))
        make_face()
        with Locations((261.956397914, -208.301971384)):
            Circle(CUT_EXTRUDE13_OUTLINE_R)
        with Locations((261.956397914, -148.301971384)):
            Circle(CUT_EXTRUDE13_OUTLINE_R)
        with Locations((261.956397914, -88.301971384)):
            Circle(CUT_EXTRUDE13_OUTLINE_R)
        with Locations((261.956397914, -28.301971384)):
            Circle(CUT_EXTRUDE13_OUTLINE_R)
        with Locations((261.956397914, 31.698028616)):
            Circle(CUT_EXTRUDE13_OUTLINE_R)
        with Locations((261.956397914, 91.698028616)):
            Circle(CUT_EXTRUDE13_OUTLINE_R)
        with Locations((261.956397914, 151.698028616)):
            Circle(CUT_EXTRUDE13_OUTLINE_R)
    extrude(amount=CUT_EXTRUDE13_DEPTH, mode=Mode.SUBTRACT)


solid = part.part
